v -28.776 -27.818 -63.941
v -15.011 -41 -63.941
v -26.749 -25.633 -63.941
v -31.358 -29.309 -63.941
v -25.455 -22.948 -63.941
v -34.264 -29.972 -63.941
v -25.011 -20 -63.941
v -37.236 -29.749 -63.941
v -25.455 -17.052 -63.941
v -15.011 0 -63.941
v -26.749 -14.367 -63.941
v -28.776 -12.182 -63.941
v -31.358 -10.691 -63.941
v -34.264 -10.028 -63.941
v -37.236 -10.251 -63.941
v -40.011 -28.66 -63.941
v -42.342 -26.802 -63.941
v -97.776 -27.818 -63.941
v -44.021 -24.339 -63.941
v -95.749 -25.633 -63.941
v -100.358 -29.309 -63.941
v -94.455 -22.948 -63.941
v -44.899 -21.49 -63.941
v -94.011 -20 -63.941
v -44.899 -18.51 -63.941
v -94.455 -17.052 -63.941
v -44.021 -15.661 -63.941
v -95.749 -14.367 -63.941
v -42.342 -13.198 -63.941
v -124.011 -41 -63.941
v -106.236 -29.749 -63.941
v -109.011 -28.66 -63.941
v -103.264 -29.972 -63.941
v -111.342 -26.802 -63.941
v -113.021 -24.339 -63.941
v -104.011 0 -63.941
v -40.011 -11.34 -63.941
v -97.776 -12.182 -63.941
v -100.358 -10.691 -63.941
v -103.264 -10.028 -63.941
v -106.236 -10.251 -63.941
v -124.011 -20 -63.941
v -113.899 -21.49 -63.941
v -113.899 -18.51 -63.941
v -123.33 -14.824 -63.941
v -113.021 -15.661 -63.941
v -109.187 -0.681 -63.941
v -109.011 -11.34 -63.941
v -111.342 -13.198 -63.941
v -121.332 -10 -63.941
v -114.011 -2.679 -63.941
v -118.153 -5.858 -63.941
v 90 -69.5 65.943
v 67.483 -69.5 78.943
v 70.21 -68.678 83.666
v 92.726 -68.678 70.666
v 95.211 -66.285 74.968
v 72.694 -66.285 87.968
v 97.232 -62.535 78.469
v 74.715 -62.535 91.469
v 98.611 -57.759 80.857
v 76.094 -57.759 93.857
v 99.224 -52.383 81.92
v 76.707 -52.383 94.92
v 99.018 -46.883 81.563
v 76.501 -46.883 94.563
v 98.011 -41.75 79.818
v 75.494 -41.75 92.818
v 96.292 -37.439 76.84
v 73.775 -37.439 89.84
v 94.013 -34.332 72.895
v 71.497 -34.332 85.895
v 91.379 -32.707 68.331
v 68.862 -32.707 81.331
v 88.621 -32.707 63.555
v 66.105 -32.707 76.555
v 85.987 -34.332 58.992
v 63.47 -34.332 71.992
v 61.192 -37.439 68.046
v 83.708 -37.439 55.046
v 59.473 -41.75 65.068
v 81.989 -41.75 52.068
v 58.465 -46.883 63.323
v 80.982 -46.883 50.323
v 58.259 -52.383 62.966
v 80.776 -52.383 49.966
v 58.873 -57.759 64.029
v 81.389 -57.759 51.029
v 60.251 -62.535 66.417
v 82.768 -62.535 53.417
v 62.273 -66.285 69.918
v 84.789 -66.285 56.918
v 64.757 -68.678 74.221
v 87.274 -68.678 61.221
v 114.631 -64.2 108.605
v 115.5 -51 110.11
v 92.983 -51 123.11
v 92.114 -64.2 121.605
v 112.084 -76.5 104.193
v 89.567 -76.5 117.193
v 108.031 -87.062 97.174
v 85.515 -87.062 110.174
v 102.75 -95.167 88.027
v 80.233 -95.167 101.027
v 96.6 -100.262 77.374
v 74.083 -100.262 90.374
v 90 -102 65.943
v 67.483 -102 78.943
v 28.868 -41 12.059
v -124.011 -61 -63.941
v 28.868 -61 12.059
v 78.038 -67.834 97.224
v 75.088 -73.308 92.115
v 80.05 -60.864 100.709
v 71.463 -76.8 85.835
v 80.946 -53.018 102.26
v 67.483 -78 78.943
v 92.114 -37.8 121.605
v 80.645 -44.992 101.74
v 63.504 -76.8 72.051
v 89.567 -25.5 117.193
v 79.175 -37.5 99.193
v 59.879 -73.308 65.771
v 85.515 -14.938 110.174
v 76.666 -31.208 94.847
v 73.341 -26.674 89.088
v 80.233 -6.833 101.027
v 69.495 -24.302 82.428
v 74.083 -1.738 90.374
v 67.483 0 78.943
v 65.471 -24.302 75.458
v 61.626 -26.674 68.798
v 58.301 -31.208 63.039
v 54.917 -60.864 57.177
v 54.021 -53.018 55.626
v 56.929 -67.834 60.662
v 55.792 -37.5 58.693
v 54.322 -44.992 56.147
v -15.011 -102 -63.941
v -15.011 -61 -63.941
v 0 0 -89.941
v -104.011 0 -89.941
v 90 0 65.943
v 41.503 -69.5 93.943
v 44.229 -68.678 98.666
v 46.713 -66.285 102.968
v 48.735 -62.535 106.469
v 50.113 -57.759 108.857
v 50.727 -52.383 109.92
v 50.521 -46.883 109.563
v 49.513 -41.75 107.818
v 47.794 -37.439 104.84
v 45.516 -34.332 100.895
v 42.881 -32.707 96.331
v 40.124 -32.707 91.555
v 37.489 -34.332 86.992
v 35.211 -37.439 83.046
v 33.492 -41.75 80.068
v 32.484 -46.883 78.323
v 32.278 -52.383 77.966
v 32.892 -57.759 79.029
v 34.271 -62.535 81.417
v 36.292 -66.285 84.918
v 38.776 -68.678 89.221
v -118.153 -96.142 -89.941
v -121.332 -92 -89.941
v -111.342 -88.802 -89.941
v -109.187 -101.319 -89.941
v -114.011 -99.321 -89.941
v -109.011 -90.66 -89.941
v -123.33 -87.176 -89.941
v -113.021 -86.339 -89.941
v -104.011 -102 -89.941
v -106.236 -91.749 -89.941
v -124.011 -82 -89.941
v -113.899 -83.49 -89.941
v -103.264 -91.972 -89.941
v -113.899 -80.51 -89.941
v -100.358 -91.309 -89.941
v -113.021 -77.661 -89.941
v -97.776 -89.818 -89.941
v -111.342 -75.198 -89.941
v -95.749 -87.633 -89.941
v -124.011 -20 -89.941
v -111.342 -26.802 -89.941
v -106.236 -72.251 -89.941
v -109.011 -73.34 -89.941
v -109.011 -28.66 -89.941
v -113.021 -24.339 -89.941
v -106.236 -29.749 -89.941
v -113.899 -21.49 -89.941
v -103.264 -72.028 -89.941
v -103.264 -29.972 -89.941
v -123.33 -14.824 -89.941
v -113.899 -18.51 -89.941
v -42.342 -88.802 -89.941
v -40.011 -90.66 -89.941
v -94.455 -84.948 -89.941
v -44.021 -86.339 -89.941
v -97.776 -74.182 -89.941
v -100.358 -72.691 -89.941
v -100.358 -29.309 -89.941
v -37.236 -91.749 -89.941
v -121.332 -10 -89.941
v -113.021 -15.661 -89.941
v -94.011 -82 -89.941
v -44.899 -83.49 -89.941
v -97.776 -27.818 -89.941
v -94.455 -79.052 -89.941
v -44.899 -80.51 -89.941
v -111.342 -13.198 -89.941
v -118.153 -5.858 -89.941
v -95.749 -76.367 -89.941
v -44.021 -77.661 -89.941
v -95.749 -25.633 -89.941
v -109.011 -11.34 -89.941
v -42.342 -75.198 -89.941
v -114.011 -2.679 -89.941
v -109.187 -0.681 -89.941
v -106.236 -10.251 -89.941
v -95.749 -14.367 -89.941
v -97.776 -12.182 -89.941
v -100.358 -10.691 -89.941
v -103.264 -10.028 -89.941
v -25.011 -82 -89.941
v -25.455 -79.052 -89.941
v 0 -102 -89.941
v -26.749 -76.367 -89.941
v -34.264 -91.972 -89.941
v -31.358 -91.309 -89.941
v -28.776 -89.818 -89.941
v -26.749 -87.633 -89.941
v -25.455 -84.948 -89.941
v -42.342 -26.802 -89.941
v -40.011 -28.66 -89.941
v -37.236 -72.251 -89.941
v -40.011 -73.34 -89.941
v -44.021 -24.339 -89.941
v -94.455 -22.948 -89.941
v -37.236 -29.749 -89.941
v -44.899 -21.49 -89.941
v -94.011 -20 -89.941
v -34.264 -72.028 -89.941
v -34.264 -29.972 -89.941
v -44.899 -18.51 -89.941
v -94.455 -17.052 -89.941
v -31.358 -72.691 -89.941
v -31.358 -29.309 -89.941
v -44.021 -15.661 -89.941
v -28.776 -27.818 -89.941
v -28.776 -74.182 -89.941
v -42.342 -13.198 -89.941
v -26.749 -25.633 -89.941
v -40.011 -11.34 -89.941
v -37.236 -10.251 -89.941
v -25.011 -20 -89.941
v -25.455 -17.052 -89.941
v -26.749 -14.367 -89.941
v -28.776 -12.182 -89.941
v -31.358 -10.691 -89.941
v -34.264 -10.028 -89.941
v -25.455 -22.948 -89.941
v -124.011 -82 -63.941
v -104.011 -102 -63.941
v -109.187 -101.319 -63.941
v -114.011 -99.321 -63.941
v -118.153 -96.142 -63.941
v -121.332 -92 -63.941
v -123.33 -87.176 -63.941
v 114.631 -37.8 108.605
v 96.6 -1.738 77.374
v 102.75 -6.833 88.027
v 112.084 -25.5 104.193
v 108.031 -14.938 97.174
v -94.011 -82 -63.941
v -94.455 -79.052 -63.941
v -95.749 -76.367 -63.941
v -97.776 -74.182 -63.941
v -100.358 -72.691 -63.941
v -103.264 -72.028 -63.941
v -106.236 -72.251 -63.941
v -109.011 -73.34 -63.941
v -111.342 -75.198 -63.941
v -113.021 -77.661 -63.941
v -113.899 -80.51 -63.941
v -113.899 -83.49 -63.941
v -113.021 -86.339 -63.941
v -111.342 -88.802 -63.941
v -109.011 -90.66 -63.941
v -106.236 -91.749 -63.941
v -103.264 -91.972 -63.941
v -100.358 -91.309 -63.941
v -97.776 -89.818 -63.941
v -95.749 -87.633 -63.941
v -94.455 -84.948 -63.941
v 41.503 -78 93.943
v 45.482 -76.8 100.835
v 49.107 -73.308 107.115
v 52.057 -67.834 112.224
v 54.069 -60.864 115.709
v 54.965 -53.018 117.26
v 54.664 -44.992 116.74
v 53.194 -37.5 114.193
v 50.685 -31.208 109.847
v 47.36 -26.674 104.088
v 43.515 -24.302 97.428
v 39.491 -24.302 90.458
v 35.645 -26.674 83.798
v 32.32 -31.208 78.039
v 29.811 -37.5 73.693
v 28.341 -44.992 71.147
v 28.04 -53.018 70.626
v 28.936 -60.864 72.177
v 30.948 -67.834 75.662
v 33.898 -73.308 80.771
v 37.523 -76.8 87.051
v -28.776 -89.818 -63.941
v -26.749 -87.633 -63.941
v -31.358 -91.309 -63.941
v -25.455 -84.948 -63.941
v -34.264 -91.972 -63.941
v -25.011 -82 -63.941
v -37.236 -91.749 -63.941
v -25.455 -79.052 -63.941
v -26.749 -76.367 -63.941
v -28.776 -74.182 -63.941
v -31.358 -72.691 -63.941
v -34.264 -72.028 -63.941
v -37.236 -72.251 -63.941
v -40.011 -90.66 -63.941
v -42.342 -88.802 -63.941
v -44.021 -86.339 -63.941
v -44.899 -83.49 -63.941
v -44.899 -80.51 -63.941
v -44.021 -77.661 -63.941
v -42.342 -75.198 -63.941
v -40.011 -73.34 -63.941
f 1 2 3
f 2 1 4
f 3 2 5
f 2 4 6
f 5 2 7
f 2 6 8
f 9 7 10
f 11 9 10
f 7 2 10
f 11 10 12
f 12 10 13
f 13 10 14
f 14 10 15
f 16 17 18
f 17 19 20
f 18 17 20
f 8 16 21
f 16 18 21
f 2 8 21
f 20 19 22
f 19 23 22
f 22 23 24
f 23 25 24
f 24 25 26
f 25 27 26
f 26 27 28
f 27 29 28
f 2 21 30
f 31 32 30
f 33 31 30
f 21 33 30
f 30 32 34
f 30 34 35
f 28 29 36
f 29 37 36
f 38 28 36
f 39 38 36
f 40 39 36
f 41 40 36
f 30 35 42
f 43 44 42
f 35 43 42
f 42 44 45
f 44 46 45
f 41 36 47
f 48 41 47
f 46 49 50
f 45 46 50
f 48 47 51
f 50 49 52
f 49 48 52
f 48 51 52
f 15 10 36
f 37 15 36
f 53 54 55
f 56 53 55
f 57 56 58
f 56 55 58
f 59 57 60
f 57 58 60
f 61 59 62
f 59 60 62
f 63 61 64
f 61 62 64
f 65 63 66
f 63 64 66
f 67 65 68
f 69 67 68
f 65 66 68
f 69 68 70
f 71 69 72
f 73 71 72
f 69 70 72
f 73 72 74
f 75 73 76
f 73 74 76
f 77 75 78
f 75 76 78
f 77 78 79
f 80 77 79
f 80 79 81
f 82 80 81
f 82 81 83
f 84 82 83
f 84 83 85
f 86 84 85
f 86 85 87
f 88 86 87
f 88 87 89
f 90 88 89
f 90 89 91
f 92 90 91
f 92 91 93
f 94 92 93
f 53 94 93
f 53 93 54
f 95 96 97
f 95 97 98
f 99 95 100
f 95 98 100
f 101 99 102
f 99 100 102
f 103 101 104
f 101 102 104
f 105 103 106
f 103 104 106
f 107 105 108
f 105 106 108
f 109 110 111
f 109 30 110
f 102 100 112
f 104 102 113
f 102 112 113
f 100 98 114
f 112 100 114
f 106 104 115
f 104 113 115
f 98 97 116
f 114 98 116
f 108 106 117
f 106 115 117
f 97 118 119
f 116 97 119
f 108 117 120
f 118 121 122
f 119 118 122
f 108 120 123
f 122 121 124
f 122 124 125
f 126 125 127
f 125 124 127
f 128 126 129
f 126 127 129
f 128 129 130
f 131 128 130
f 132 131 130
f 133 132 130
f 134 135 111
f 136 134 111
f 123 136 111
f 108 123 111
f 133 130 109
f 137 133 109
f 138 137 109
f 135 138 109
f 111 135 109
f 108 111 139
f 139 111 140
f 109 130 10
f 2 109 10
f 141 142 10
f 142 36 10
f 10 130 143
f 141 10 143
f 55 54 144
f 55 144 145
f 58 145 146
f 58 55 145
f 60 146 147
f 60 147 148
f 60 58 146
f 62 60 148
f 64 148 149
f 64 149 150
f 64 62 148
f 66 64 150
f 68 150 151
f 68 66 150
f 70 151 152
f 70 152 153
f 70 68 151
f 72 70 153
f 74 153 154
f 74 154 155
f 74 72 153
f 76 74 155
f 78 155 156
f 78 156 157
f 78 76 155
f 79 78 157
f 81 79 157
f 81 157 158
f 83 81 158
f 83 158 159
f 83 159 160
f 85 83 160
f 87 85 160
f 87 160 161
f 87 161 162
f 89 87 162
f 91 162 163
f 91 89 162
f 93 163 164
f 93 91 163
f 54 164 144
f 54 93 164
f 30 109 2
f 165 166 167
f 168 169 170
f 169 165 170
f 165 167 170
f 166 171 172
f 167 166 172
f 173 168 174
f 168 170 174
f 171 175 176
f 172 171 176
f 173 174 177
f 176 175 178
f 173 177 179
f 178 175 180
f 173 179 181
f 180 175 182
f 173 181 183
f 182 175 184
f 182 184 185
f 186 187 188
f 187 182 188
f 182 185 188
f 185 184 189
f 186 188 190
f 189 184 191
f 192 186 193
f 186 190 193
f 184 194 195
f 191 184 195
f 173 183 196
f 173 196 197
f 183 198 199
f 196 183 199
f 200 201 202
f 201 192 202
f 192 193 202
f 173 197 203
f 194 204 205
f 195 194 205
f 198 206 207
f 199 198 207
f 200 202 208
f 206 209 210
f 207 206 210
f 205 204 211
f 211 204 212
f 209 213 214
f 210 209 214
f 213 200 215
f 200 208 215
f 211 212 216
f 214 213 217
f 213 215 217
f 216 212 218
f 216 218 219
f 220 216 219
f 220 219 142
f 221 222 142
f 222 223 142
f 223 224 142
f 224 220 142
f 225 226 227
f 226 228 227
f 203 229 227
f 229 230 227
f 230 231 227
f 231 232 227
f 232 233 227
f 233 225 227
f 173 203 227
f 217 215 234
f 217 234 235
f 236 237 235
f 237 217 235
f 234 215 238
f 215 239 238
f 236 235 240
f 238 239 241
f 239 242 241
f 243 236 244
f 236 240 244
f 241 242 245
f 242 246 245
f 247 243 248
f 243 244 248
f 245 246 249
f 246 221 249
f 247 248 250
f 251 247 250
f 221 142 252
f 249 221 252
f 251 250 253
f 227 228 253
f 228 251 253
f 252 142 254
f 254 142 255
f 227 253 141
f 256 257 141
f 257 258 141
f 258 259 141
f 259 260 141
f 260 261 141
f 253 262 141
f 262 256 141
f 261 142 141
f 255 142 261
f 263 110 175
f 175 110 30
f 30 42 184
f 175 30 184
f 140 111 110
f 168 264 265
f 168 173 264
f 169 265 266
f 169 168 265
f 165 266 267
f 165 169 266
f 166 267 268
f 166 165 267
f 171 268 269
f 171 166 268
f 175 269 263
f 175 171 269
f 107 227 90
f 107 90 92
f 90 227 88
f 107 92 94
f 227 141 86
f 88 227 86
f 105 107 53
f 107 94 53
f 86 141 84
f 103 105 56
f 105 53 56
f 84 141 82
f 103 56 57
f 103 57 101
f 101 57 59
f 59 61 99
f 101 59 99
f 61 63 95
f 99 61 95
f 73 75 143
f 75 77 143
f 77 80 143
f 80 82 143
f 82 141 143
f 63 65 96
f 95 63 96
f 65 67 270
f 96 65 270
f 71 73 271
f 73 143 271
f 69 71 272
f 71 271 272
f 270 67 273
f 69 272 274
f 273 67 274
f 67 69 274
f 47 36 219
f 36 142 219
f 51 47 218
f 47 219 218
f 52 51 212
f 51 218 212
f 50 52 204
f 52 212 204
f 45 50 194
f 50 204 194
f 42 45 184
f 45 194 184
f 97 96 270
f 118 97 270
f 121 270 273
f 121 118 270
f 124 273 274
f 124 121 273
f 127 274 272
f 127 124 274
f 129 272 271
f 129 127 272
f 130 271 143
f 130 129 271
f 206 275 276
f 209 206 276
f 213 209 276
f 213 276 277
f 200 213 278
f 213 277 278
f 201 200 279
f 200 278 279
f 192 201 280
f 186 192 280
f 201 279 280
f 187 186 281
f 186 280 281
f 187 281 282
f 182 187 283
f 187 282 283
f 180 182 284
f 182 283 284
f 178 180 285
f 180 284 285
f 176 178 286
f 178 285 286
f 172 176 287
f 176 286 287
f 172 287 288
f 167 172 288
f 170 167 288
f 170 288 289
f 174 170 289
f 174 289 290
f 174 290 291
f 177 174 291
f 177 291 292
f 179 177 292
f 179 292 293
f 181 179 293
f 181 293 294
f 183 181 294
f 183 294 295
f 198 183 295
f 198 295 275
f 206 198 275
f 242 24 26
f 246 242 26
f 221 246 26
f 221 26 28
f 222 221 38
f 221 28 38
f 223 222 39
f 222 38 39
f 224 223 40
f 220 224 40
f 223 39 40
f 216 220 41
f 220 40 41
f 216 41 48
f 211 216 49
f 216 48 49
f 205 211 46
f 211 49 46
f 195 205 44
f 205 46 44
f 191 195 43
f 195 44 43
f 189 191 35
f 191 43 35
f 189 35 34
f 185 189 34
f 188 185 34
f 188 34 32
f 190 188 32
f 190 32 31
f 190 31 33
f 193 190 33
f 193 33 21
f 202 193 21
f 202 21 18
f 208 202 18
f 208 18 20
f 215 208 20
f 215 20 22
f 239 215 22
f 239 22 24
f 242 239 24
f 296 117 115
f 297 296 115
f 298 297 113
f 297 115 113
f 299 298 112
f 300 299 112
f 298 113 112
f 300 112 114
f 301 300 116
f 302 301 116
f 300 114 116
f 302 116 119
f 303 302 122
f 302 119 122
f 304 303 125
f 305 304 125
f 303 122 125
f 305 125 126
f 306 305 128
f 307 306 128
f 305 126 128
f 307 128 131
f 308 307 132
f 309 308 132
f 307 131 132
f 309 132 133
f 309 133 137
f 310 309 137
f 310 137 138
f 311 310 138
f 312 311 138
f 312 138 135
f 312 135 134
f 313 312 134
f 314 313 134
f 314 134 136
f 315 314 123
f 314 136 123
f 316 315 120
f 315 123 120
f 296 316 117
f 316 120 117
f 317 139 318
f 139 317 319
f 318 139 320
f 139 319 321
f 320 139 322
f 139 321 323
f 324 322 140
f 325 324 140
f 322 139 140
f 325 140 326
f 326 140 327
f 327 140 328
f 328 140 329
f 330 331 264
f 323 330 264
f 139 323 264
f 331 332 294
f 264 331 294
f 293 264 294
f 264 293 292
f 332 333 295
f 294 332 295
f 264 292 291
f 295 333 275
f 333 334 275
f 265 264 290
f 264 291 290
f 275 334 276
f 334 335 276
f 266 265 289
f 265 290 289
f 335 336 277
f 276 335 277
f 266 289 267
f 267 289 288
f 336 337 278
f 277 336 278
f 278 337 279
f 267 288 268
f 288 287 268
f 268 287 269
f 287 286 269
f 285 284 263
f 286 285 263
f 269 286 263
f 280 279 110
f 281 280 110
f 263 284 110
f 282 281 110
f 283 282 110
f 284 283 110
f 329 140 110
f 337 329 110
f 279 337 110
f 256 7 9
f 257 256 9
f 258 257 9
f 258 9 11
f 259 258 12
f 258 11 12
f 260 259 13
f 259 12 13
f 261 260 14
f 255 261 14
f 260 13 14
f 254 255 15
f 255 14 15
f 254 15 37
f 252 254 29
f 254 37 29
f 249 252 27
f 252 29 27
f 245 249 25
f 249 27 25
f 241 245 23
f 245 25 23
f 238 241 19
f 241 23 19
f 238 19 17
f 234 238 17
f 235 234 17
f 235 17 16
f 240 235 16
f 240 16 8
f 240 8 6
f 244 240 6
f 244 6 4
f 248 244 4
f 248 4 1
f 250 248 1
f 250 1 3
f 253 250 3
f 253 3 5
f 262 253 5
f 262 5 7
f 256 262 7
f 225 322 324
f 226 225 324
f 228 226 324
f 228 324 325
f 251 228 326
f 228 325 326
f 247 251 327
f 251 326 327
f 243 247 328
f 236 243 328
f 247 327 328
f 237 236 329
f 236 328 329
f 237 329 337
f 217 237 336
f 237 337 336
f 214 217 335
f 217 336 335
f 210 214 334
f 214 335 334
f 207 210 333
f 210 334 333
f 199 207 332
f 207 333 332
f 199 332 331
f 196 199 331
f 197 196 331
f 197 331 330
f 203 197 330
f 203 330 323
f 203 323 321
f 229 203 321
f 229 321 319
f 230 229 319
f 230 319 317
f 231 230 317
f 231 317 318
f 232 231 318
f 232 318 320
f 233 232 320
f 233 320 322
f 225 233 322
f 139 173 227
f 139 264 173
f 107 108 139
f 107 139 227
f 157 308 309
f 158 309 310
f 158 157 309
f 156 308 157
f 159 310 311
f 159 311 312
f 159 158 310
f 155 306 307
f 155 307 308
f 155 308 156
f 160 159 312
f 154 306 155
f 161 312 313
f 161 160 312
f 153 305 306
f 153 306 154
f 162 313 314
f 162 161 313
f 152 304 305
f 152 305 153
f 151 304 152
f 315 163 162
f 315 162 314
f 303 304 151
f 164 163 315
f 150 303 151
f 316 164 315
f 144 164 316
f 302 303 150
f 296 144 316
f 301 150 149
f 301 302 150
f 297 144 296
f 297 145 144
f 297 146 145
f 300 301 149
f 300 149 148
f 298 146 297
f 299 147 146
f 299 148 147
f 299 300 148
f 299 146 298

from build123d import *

# Parameters (mm, degrees)
F1_DEPTH  = 102
F2_R      = 50.99999
F3_R      = 27
F3_R_2    = 18.5
F4_DEPTH  = 30
F5_R      = 18.5
F6_DEPTH  = 30
F9_DEPTH  = 10
F10_R     = 10
F11_DEPTH = 30
F12_R     = 20


# Not quite as in the source:
# - a fillet or chamfer is up to 0.001 mm smaller than in the source, because OpenCascade refuses the exact size


with BuildPart() as f1:
    # F0 (on Front) → F1 (new body)
    with BuildSketch(Plane.XZ):
        Polygon((-15.0111069989, -63.9414438152), (-124.0111069989, -63.9414438152), (-124.0111069989, -89.9414438152), (0, -89.9414438152), (115.5, 110.110424459), (92.9833395016, 123.110424459), align=None)
    extrude(amount=F1_DEPTH)

    # F2 (radius 51 in the source; OpenCascade refuses exactly that, so slightly less here)
    f2_edges = [f1.edges().sort_by_distance(p)[0] for p in [
        (104.24167, 0, 116.610424),
        (104.24167, -102, 116.610424),
    ]]
    fillet(f2_edges, radius=F2_R)

    # F3 (on face) → F4 (join)
    with BuildSketch(Plane(origin=(16.4291271001, 0, -9.4853609538), x_dir=(0, -1, 0), z_dir=(-0.8660254038, 0, 0.5))):
        with Locations((51, 102.108424803)):
            Circle(F3_R)
        with Locations((51, 102.108424803)):
            Circle(F3_R_2, mode=Mode.SUBTRACT)
    extrude(amount=F4_DEPTH)

    # F5 (on face) → F6 (cut)
    with BuildSketch(Plane(origin=(16.4291271001, 0, -9.4853609538), x_dir=(0, -1, 0), z_dir=(-0.8660254038, 0, 0.5))):
        with Locations((51, 102.108424803)):
            Circle(F5_R)
    extrude(amount=-F6_DEPTH, mode=Mode.SUBTRACT)

    # F8 (on offset) → F9 (join, symmetric)
    with BuildSketch(Plane(origin=(0, -51, 0), x_dir=(-1, 0, 0), z_dir=(0, 1, 0))):
        Polygon((-28.8675134595, 12.0585561848), (15.0111069989, -63.9414438152), (124.0111069989, -63.9414438152), align=None)
    extrude(amount=F9_DEPTH, both=True)

    # F10 (on face) → F11 (cut)
    with BuildSketch(Plane.XY.offset(-63.9414438152)):
        with Locations((-104.0111069989, -20)):
            Circle(F10_R)
        with Locations((-104.0111069989, -82)):
            Circle(F10_R)
        with Locations((-35.0111069989, -20)):
            Circle(F10_R)
        with Locations((-35.0111069989, -82)):
            Circle(F10_R)
    extrude(amount=-F11_DEPTH, mode=Mode.SUBTRACT)

    # F12
    f12_edges = [f1.edges().sort_by_distance(p)[0] for p in [
        (-124.011107, 0, -76.941444),
        (-124.011107, -102, -76.941444),
    ]]
    fillet(f12_edges, radius=F12_R)


solid = f1.part
